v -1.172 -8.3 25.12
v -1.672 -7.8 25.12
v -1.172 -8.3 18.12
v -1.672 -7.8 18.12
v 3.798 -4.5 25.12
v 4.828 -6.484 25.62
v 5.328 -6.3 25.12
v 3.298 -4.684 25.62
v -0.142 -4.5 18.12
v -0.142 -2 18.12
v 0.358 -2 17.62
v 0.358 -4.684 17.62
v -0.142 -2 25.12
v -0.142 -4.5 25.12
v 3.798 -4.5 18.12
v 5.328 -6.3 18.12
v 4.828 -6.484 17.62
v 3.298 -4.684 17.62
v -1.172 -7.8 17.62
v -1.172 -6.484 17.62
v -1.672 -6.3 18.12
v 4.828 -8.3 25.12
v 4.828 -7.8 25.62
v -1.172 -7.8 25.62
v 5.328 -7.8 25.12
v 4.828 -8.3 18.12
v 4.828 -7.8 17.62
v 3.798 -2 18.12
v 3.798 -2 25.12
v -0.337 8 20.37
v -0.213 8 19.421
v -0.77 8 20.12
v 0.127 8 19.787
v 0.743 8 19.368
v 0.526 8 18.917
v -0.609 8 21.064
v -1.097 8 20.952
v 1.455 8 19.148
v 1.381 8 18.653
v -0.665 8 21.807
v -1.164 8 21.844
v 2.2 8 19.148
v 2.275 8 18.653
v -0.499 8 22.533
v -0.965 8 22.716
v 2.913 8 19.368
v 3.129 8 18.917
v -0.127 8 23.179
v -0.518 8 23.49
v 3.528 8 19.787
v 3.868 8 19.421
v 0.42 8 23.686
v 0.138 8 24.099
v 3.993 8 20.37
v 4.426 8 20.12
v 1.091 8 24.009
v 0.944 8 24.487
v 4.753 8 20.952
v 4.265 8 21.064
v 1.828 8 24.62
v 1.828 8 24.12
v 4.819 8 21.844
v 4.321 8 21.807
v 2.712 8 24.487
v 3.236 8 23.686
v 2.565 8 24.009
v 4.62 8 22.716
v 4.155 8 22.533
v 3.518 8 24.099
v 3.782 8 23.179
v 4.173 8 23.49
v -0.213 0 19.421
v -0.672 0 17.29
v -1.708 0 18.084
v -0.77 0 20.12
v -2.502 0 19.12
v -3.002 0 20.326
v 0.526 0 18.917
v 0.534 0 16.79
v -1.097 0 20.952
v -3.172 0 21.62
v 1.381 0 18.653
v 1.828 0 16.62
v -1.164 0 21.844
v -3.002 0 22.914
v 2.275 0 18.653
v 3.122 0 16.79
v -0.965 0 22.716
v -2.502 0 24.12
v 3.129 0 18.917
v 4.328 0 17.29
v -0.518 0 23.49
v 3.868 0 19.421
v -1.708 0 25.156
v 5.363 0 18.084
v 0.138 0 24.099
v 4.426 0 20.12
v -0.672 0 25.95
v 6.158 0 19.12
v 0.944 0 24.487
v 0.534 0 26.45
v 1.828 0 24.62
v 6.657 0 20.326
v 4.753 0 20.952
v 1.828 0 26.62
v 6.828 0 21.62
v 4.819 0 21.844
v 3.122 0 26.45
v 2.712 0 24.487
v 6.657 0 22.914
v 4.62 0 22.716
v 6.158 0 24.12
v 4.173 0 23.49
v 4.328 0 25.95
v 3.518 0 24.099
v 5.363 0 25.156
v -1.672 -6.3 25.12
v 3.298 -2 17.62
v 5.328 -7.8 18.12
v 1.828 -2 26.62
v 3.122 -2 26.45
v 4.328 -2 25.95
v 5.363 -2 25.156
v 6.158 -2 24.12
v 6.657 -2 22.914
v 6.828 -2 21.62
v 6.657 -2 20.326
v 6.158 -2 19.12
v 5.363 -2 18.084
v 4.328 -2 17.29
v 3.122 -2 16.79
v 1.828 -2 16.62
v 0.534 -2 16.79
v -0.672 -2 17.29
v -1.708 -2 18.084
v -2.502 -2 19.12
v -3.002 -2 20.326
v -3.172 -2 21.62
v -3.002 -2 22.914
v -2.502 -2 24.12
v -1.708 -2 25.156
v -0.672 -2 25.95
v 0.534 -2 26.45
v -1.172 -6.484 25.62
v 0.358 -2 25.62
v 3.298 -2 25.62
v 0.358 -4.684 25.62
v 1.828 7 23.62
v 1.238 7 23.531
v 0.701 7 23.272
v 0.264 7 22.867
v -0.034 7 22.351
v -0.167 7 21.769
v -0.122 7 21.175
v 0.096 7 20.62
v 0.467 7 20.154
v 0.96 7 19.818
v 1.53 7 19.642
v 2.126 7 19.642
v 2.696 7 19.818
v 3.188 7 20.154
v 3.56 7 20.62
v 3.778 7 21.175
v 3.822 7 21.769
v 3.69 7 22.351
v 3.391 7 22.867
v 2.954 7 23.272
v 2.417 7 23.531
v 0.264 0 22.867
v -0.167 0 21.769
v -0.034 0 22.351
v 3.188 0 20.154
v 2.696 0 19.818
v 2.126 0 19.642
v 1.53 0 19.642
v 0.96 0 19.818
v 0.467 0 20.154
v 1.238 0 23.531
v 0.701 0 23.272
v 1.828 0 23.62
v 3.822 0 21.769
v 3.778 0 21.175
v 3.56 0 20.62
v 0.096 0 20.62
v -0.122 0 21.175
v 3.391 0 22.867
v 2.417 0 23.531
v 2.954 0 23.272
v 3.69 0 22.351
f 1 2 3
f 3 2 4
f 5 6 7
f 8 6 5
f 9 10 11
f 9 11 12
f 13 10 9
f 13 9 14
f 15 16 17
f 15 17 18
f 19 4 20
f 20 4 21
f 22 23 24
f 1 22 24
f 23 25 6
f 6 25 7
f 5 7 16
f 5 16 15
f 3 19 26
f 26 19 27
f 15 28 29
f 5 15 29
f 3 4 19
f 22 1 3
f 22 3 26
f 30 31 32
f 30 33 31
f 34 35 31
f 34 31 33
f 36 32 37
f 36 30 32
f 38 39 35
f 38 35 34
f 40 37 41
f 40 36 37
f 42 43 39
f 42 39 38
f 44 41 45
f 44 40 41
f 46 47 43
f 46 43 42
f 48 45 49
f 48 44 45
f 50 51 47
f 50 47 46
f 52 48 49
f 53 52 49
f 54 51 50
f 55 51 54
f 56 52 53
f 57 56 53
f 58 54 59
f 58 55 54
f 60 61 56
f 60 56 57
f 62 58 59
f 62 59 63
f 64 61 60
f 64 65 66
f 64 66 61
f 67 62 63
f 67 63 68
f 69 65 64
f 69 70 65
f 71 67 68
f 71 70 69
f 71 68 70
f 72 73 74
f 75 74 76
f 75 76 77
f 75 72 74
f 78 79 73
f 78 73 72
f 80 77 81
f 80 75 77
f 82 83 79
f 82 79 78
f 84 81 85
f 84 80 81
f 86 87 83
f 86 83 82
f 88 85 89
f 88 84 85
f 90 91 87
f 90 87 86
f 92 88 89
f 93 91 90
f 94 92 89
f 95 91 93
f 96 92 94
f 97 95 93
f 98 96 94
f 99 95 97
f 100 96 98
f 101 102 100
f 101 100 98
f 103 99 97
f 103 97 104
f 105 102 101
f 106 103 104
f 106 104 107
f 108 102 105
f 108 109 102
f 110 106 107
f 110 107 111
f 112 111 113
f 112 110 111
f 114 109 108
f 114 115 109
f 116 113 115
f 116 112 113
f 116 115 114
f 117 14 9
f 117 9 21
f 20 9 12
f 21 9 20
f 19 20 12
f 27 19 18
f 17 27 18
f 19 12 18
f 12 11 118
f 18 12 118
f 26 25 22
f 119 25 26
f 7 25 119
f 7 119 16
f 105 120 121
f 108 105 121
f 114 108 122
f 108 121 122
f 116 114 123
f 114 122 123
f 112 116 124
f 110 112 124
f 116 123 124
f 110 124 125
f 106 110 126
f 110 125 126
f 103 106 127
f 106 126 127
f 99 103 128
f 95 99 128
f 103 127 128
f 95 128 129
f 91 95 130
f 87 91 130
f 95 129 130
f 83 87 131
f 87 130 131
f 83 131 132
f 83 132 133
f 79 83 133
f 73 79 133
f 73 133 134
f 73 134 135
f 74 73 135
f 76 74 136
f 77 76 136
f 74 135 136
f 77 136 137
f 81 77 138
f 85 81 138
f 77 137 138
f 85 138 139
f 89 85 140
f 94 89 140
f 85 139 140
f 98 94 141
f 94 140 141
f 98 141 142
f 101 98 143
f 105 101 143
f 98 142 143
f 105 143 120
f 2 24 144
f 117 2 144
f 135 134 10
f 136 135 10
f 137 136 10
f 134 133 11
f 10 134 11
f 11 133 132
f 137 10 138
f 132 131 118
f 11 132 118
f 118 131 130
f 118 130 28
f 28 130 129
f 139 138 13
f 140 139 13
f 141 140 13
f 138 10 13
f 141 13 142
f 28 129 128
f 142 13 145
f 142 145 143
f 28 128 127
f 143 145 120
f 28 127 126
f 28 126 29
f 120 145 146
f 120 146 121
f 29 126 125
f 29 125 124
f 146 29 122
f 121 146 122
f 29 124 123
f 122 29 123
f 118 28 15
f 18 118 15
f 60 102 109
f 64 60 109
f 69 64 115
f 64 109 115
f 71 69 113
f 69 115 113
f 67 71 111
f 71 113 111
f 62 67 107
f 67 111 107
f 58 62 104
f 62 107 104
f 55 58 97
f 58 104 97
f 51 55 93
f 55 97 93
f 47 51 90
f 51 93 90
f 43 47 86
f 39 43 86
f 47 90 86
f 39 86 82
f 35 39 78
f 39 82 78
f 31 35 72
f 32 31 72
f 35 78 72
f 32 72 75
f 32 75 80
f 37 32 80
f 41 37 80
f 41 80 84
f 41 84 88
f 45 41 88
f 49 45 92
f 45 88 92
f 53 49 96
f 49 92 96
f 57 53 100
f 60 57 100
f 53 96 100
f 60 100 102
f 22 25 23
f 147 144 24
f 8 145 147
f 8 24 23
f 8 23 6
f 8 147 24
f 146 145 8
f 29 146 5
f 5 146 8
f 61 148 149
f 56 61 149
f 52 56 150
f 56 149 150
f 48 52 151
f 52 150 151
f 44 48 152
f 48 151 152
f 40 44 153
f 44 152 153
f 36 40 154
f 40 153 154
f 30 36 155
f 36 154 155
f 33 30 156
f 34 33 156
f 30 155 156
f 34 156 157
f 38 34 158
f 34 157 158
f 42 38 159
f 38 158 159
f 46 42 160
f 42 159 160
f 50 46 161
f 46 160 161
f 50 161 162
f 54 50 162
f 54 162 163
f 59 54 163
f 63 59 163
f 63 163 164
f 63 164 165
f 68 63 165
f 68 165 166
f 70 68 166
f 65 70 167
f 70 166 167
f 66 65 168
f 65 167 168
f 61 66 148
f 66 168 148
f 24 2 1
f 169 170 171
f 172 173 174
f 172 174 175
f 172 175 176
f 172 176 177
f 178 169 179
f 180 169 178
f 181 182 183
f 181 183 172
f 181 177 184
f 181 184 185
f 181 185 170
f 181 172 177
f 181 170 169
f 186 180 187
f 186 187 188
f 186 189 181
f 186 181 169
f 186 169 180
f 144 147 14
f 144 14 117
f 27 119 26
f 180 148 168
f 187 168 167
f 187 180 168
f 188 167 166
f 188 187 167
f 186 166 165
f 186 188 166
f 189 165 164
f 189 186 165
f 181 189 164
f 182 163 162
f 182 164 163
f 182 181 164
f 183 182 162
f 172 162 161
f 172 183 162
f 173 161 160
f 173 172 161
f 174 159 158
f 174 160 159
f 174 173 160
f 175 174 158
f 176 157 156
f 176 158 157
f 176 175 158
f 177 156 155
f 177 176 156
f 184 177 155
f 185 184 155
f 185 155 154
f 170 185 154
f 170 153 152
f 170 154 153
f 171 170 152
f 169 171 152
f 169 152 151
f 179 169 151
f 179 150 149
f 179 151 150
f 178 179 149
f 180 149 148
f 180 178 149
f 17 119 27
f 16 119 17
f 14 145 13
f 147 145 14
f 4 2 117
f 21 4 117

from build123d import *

# Parameters (mm, degrees)
BOSS_EXTRUDE9_DEPTH      = 5.6
BOSS_EXTRUDE9_DEPTH_BACK = 2
SKETCH16_W               = 8
SKETCH16_H               = 3.5
BOSS_EXTRUDE11_DEPTH     = 8
CHAMFER2_SIZE            = 1.5
SKETCH17_W               = 3.94
SKETCH17_H               = 8
BOSS_EXTRUDE12_DEPTH     = 6.3
CUT_EXTRUDE2_START       = -5.6
CUT_EXTRUDE2_DEPTH       = 3.6
SKETCH21_R               = 1.5
BOSS_EXTRUDE14_DEPTH     = 3.6
CHAMFER4_SIZE            = 1
CUT_EXTRUDE3_DEPTH       = 3.6
SPLIT1_START             = -2
SPLIT1_DEPTH             = 7.6
SKETCH22_R               = 5
BOSS_EXTRUDE15_DEPTH     = 2
SKETCH23_R               = 3
BOSS_EXTRUDE16_DEPTH     = 8
CUT_EXTRUDE4_DEPTH       = 32.952026383
CUT_EXTRUDE4_DEPTH_BACK  = 8
SKETCH24_R               = 2
CHAMFER5_SIZE            = 0.5
CHAMFER5_SIZE2           = 1
SKETCH25_W               = 1.53
SKETCH25_H               = 2
BOSS_EXTRUDE17_DEPTH     = 8
CHAMFER6_SIZE            = 0.5


# Read off the part's stored shape, not the designer's step: Split1
with BuildPart() as part:
    # Sketch14 → Boss-Extrude9 (new, two sides: drawn at the far end of the back side and taken through both)
    with BuildSketch(Plane(origin=(0, 0, 0), x_dir=(1, 0, 0), z_dir=(0, 1, 0)).offset(-BOSS_EXTRUDE9_DEPTH_BACK)):
        with BuildLine():
            Line((-4.172171186, -20.619968889), (-4.172171186, -25.619968889))
            Line((-4.172171186, -25.619968889), (7.827828814, -25.619968889))
            Line((7.827828814, -25.619968889), (7.827828814, -20.619968889))
            ThreePointArc((7.827828814, -20.619968889), (1.827828814, -14.619968889), (-4.172171186, -20.619968889))
        make_face()
    extrude(amount=BOSS_EXTRUDE9_DEPTH + BOSS_EXTRUDE9_DEPTH_BACK)

    # Sketch16 → Boss-Extrude11 (add)
    with BuildSketch(Plane.XY.offset(25.619968889)):
        with Locations((1.827828814, 1.75)):
            Rectangle(SKETCH16_W, SKETCH16_H)
    extrude(amount=BOSS_EXTRUDE11_DEPTH)

    # Chamfer2
    chamfer2_edges = [part.edges().sort_by_distance(p)[0] for p in [
        (1.827828814, -2, 14.619968889),
        (7.827828814, 5.6, 23.119968889),
        (1.827828814, 5.6, 14.619968889),
        (-4.172171186, -2, 23.119968889),
        (-4.172171186, 5.6, 23.119968889),
        (7.827828814, -2, 23.119968889),
    ]]
    chamfer(chamfer2_edges, length=CHAMFER2_SIZE)

    # Sketch17 → Boss-Extrude12 (add)
    with BuildSketch(Plane.XZ.offset(2)):
        with Locations((1.827828814, 21.619968889)):
            Rectangle(SKETCH17_W, SKETCH17_H)
    extrude(amount=BOSS_EXTRUDE12_DEPTH)

    # Sketch20 → Cut-Extrude2 (cut)
    with BuildSketch(Plane(origin=(0, 5.6, 0), x_dir=(1, 0, 0), z_dir=(0, 1, 0)).offset(CUT_EXTRUDE2_START)):
        with BuildLine():
            Line((7.827828814, -20.619968889), (-4.172171186, -20.619968889))
            ThreePointArc((-4.172171186, -20.619968889), (1.827828814, -14.619968889), (7.827828814, -20.619968889))
        make_face()
    extrude(amount=CUT_EXTRUDE2_DEPTH, mode=Mode.SUBTRACT)

    # Sketch21 → Boss-Extrude14 (add)
    with BuildSketch(Plane(origin=(0, 0, 0), x_dir=(1, 0, 0), z_dir=(0, 1, 0))):
        with BuildLine():
            ThreePointArc((7.827828814, -20.619968889), (7.63955943, -19.128732072), (7.086566399, -17.731080001))
            ThreePointArc((7.086566399, -17.731080001), (6.279209969, -19.350325806), (4.990106474, -20.619968889))
            Line((4.990106474, -20.619968889), (7.827828814, -20.619968889))
        make_face()
        with BuildLine():
            ThreePointArc((-1.334448847, -20.619968889), (-2.623552342, -19.350325806), (-3.430908771, -17.731080001))
            ThreePointArc((-3.430908771, -17.731080001), (-3.983901803, -19.128732072), (-4.172171186, -20.619968889))
            Line((-4.172171186, -20.619968889), (-1.334448847, -20.619968889))
        make_face()
        with Locations(Location((1.827828814, -16.119968889, 0), (0, 0, 90.000763944))):
            Circle(SKETCH21_R)
    extrude(amount=BOSS_EXTRUDE14_DEPTH)

    # Chamfer4
    # the kernel refuses this chamfer: 1 mm, written as the material it adds along each edge
    with BuildSketch(Plane(origin=(1.827828814, 3.6, 16.119968889), x_dir=(-1.3333338100422289e-05, 0, -0.999999999911111), z_dir=(0.999999999911111, 0, -1.3333338100422289e-05))) as chamfer4_piece_1_section:
        Polygon((1.5, -CHAMFER4_SIZE), (1.5 + CHAMFER4_SIZE, 0), (1.5, 0), align=None)
    chamfer4_piece_1 = revolve(axis=Axis((1.827828814, 3.6, 16.119968889), (0, 1, 0)), mode=Mode.PRIVATE)
    chamfer4_piece_1 = chamfer4_piece_1 & Plane(origin=(1.827828814, 3.111670507, 20.619968889), x_dir=(1, 0, 0), z_dir=(0, -1, 0)) * Cylinder(6, 10, mode=Mode.PRIVATE)
    add(chamfer4_piece_1)
    with BuildSketch(Plane(origin=(1.827828814, 0, 16.119968889), x_dir=(-1.3333338100422289e-05, 0, -0.999999999911111), z_dir=(0.999999999911111, 0, -1.3333338100422289e-05))) as chamfer4_piece_2_section:
        Polygon((1.5 + CHAMFER4_SIZE, 0), (1.5, CHAMFER4_SIZE), (1.5, 0), align=None)
    chamfer4_piece_2 = revolve(axis=Axis((1.827828814, 0, 16.119968889), (0, 1, 0)), mode=Mode.PRIVATE)
    chamfer4_piece_2 = chamfer4_piece_2 & Plane(origin=(1.827828814, 0.488329493, 20.619968889), x_dir=(1, 0, 0), z_dir=(0, -1, 0)) * Cylinder(6, 10, mode=Mode.PRIVATE)
    add(chamfer4_piece_2)

    # Sketch21<3> → Cut-Extrude3 (cut)
    with BuildSketch(Plane(origin=(0, 0, 0), x_dir=(1, 0, 0), z_dir=(0, 1, 0))):
        with BuildLine():
            Line((4.990106474, -20.619968889), (-1.334448847, -20.619968889))
            ThreePointArc((-1.334448847, -20.619968889), (1.827828814, -21.619968889), (4.990106474, -20.619968889))
        make_face()
    extrude(amount=CUT_EXTRUDE3_DEPTH, mode=Mode.SUBTRACT)

    # Split1 outline → Split1 (cut)
    with BuildSketch(Plane(origin=(0, 0, 0), x_dir=(1, 0, 0), z_dir=(0, 1, 0)).offset(SPLIT1_START)):
        with BuildLine():
            Line((7.827828814, -25.619968889), (7.827828814, -20.619968889))
            ThreePointArc((7.827828814, -20.619968889), (1.827828814, -14.619968889), (-4.172171186, -20.619968889))
            Line((-4.172171186, -20.619968889), (-4.172171186, -25.619968889))
            Line((-4.172171186, -25.619968889), (-2.172171186, -25.619968889))
            Line((-2.172171186, -25.619968889), (-2.172171186, -33.619968889))
            Line((-2.172171186, -33.619968889), (5.827828814, -33.619968889))
            Line((5.827828814, -33.619968889), (5.827828814, -25.619968889))
            Line((5.827828814, -25.619968889), (7.827828814, -25.619968889))
        make_face()
    extrude(amount=SPLIT1_DEPTH, mode=Mode.SUBTRACT)

    # Sketch22 → Boss-Extrude15 (add)
    with BuildSketch(Plane(origin=(0, -2, 0), x_dir=(1, 0, 0), z_dir=(0, 1, 0))):
        with Locations(Location((1.827828814, -21.619968889, 0), (0, 0, 270))):
            Circle(SKETCH22_R)
    extrude(amount=BOSS_EXTRUDE15_DEPTH)

    # Sketch23 → Boss-Extrude16 (add)
    with BuildSketch(Plane(origin=(0, 0, 0), x_dir=(1, 0, 0), z_dir=(0, 1, 0))):
        with Locations(Location((1.827828814, -21.619968889, 0), (0, 0, 270))):
            Circle(SKETCH23_R)
    extrude(amount=BOSS_EXTRUDE16_DEPTH)

    # Sketch24 → Cut-Extrude4 (cut, two sides: drawn at the far end of the back side and taken through both)
    with BuildSketch(Plane(origin=(0, 8, 0), x_dir=(1, 0, 0), z_dir=(0, 1, 0)).offset(-CUT_EXTRUDE4_DEPTH_BACK)):
        with Locations(Location((1.827828814, -21.619968889, 0), (0, 0, 270))):
            Circle(SKETCH24_R)
    extrude(amount=CUT_EXTRUDE4_DEPTH + CUT_EXTRUDE4_DEPTH_BACK, mode=Mode.SUBTRACT)

    # Chamfer5
    chamfer5_edges = [part.edges().sort_by_distance(p)[0] for p in [
        (1.827828814, 8, 19.619968889),
    ]]
    chamfer5_side = [part.faces().sort_by_distance(p)[0] for p in [
        (1.827828814, 8, 18.704821703),
    ]]
    chamfer(chamfer5_edges, length=CHAMFER5_SIZE, length2=CHAMFER5_SIZE2, reference=chamfer5_side[0])

    # Sketch25 → Boss-Extrude17 (add)
    with BuildSketch(Plane.XY.offset(25.619968889)):
        Polygon((3.797828814, -4.5), (3.797828814, -6.3), (5.327828814, -6.3), align=None)
        with Locations((4.562828814, -7.3)):
            Rectangle(SKETCH25_W, SKETCH25_H)
        with Locations((-0.907171186, -7.3)):
            Rectangle(SKETCH25_W, SKETCH25_H)
        Polygon((-0.142171186, -4.5), (-1.672171186, -6.3), (-0.142171186, -6.3), align=None)
    extrude(amount=-BOSS_EXTRUDE17_DEPTH)

    # Chamfer6
    chamfer6_edges = [part.edges().sort_by_distance(p)[0] for p in [
        (3.797828814, -3.25, 17.619968889),
        (-0.142171186, -3.25, 17.619968889),
        (3.797828814, -3.25, 25.619968889),
        (-0.142171186, -3.25, 25.619968889),
        (5.327828814, -7.3, 17.619968889),
        (5.327828814, -7.3, 25.619968889),
        (5.327828814, -8.3, 21.619968889),
        (4.562828814, -5.4, 25.619968889),
        (4.562828814, -5.4, 17.619968889),
        (-1.672171186, -8.3, 21.619968889),
        (-0.907171186, -5.4, 17.619968889),
        (-0.907171186, -5.4, 25.619968889),
        (-1.672171186, -7.3, 25.619968889),
        (-1.672171186, -7.3, 17.619968889),
        (1.827828814, -8.3, 25.619968889),
        (1.827828814, -8.3, 17.619968889),
    ]]
    chamfer(chamfer6_edges, length=CHAMFER6_SIZE)


solid = part.part
